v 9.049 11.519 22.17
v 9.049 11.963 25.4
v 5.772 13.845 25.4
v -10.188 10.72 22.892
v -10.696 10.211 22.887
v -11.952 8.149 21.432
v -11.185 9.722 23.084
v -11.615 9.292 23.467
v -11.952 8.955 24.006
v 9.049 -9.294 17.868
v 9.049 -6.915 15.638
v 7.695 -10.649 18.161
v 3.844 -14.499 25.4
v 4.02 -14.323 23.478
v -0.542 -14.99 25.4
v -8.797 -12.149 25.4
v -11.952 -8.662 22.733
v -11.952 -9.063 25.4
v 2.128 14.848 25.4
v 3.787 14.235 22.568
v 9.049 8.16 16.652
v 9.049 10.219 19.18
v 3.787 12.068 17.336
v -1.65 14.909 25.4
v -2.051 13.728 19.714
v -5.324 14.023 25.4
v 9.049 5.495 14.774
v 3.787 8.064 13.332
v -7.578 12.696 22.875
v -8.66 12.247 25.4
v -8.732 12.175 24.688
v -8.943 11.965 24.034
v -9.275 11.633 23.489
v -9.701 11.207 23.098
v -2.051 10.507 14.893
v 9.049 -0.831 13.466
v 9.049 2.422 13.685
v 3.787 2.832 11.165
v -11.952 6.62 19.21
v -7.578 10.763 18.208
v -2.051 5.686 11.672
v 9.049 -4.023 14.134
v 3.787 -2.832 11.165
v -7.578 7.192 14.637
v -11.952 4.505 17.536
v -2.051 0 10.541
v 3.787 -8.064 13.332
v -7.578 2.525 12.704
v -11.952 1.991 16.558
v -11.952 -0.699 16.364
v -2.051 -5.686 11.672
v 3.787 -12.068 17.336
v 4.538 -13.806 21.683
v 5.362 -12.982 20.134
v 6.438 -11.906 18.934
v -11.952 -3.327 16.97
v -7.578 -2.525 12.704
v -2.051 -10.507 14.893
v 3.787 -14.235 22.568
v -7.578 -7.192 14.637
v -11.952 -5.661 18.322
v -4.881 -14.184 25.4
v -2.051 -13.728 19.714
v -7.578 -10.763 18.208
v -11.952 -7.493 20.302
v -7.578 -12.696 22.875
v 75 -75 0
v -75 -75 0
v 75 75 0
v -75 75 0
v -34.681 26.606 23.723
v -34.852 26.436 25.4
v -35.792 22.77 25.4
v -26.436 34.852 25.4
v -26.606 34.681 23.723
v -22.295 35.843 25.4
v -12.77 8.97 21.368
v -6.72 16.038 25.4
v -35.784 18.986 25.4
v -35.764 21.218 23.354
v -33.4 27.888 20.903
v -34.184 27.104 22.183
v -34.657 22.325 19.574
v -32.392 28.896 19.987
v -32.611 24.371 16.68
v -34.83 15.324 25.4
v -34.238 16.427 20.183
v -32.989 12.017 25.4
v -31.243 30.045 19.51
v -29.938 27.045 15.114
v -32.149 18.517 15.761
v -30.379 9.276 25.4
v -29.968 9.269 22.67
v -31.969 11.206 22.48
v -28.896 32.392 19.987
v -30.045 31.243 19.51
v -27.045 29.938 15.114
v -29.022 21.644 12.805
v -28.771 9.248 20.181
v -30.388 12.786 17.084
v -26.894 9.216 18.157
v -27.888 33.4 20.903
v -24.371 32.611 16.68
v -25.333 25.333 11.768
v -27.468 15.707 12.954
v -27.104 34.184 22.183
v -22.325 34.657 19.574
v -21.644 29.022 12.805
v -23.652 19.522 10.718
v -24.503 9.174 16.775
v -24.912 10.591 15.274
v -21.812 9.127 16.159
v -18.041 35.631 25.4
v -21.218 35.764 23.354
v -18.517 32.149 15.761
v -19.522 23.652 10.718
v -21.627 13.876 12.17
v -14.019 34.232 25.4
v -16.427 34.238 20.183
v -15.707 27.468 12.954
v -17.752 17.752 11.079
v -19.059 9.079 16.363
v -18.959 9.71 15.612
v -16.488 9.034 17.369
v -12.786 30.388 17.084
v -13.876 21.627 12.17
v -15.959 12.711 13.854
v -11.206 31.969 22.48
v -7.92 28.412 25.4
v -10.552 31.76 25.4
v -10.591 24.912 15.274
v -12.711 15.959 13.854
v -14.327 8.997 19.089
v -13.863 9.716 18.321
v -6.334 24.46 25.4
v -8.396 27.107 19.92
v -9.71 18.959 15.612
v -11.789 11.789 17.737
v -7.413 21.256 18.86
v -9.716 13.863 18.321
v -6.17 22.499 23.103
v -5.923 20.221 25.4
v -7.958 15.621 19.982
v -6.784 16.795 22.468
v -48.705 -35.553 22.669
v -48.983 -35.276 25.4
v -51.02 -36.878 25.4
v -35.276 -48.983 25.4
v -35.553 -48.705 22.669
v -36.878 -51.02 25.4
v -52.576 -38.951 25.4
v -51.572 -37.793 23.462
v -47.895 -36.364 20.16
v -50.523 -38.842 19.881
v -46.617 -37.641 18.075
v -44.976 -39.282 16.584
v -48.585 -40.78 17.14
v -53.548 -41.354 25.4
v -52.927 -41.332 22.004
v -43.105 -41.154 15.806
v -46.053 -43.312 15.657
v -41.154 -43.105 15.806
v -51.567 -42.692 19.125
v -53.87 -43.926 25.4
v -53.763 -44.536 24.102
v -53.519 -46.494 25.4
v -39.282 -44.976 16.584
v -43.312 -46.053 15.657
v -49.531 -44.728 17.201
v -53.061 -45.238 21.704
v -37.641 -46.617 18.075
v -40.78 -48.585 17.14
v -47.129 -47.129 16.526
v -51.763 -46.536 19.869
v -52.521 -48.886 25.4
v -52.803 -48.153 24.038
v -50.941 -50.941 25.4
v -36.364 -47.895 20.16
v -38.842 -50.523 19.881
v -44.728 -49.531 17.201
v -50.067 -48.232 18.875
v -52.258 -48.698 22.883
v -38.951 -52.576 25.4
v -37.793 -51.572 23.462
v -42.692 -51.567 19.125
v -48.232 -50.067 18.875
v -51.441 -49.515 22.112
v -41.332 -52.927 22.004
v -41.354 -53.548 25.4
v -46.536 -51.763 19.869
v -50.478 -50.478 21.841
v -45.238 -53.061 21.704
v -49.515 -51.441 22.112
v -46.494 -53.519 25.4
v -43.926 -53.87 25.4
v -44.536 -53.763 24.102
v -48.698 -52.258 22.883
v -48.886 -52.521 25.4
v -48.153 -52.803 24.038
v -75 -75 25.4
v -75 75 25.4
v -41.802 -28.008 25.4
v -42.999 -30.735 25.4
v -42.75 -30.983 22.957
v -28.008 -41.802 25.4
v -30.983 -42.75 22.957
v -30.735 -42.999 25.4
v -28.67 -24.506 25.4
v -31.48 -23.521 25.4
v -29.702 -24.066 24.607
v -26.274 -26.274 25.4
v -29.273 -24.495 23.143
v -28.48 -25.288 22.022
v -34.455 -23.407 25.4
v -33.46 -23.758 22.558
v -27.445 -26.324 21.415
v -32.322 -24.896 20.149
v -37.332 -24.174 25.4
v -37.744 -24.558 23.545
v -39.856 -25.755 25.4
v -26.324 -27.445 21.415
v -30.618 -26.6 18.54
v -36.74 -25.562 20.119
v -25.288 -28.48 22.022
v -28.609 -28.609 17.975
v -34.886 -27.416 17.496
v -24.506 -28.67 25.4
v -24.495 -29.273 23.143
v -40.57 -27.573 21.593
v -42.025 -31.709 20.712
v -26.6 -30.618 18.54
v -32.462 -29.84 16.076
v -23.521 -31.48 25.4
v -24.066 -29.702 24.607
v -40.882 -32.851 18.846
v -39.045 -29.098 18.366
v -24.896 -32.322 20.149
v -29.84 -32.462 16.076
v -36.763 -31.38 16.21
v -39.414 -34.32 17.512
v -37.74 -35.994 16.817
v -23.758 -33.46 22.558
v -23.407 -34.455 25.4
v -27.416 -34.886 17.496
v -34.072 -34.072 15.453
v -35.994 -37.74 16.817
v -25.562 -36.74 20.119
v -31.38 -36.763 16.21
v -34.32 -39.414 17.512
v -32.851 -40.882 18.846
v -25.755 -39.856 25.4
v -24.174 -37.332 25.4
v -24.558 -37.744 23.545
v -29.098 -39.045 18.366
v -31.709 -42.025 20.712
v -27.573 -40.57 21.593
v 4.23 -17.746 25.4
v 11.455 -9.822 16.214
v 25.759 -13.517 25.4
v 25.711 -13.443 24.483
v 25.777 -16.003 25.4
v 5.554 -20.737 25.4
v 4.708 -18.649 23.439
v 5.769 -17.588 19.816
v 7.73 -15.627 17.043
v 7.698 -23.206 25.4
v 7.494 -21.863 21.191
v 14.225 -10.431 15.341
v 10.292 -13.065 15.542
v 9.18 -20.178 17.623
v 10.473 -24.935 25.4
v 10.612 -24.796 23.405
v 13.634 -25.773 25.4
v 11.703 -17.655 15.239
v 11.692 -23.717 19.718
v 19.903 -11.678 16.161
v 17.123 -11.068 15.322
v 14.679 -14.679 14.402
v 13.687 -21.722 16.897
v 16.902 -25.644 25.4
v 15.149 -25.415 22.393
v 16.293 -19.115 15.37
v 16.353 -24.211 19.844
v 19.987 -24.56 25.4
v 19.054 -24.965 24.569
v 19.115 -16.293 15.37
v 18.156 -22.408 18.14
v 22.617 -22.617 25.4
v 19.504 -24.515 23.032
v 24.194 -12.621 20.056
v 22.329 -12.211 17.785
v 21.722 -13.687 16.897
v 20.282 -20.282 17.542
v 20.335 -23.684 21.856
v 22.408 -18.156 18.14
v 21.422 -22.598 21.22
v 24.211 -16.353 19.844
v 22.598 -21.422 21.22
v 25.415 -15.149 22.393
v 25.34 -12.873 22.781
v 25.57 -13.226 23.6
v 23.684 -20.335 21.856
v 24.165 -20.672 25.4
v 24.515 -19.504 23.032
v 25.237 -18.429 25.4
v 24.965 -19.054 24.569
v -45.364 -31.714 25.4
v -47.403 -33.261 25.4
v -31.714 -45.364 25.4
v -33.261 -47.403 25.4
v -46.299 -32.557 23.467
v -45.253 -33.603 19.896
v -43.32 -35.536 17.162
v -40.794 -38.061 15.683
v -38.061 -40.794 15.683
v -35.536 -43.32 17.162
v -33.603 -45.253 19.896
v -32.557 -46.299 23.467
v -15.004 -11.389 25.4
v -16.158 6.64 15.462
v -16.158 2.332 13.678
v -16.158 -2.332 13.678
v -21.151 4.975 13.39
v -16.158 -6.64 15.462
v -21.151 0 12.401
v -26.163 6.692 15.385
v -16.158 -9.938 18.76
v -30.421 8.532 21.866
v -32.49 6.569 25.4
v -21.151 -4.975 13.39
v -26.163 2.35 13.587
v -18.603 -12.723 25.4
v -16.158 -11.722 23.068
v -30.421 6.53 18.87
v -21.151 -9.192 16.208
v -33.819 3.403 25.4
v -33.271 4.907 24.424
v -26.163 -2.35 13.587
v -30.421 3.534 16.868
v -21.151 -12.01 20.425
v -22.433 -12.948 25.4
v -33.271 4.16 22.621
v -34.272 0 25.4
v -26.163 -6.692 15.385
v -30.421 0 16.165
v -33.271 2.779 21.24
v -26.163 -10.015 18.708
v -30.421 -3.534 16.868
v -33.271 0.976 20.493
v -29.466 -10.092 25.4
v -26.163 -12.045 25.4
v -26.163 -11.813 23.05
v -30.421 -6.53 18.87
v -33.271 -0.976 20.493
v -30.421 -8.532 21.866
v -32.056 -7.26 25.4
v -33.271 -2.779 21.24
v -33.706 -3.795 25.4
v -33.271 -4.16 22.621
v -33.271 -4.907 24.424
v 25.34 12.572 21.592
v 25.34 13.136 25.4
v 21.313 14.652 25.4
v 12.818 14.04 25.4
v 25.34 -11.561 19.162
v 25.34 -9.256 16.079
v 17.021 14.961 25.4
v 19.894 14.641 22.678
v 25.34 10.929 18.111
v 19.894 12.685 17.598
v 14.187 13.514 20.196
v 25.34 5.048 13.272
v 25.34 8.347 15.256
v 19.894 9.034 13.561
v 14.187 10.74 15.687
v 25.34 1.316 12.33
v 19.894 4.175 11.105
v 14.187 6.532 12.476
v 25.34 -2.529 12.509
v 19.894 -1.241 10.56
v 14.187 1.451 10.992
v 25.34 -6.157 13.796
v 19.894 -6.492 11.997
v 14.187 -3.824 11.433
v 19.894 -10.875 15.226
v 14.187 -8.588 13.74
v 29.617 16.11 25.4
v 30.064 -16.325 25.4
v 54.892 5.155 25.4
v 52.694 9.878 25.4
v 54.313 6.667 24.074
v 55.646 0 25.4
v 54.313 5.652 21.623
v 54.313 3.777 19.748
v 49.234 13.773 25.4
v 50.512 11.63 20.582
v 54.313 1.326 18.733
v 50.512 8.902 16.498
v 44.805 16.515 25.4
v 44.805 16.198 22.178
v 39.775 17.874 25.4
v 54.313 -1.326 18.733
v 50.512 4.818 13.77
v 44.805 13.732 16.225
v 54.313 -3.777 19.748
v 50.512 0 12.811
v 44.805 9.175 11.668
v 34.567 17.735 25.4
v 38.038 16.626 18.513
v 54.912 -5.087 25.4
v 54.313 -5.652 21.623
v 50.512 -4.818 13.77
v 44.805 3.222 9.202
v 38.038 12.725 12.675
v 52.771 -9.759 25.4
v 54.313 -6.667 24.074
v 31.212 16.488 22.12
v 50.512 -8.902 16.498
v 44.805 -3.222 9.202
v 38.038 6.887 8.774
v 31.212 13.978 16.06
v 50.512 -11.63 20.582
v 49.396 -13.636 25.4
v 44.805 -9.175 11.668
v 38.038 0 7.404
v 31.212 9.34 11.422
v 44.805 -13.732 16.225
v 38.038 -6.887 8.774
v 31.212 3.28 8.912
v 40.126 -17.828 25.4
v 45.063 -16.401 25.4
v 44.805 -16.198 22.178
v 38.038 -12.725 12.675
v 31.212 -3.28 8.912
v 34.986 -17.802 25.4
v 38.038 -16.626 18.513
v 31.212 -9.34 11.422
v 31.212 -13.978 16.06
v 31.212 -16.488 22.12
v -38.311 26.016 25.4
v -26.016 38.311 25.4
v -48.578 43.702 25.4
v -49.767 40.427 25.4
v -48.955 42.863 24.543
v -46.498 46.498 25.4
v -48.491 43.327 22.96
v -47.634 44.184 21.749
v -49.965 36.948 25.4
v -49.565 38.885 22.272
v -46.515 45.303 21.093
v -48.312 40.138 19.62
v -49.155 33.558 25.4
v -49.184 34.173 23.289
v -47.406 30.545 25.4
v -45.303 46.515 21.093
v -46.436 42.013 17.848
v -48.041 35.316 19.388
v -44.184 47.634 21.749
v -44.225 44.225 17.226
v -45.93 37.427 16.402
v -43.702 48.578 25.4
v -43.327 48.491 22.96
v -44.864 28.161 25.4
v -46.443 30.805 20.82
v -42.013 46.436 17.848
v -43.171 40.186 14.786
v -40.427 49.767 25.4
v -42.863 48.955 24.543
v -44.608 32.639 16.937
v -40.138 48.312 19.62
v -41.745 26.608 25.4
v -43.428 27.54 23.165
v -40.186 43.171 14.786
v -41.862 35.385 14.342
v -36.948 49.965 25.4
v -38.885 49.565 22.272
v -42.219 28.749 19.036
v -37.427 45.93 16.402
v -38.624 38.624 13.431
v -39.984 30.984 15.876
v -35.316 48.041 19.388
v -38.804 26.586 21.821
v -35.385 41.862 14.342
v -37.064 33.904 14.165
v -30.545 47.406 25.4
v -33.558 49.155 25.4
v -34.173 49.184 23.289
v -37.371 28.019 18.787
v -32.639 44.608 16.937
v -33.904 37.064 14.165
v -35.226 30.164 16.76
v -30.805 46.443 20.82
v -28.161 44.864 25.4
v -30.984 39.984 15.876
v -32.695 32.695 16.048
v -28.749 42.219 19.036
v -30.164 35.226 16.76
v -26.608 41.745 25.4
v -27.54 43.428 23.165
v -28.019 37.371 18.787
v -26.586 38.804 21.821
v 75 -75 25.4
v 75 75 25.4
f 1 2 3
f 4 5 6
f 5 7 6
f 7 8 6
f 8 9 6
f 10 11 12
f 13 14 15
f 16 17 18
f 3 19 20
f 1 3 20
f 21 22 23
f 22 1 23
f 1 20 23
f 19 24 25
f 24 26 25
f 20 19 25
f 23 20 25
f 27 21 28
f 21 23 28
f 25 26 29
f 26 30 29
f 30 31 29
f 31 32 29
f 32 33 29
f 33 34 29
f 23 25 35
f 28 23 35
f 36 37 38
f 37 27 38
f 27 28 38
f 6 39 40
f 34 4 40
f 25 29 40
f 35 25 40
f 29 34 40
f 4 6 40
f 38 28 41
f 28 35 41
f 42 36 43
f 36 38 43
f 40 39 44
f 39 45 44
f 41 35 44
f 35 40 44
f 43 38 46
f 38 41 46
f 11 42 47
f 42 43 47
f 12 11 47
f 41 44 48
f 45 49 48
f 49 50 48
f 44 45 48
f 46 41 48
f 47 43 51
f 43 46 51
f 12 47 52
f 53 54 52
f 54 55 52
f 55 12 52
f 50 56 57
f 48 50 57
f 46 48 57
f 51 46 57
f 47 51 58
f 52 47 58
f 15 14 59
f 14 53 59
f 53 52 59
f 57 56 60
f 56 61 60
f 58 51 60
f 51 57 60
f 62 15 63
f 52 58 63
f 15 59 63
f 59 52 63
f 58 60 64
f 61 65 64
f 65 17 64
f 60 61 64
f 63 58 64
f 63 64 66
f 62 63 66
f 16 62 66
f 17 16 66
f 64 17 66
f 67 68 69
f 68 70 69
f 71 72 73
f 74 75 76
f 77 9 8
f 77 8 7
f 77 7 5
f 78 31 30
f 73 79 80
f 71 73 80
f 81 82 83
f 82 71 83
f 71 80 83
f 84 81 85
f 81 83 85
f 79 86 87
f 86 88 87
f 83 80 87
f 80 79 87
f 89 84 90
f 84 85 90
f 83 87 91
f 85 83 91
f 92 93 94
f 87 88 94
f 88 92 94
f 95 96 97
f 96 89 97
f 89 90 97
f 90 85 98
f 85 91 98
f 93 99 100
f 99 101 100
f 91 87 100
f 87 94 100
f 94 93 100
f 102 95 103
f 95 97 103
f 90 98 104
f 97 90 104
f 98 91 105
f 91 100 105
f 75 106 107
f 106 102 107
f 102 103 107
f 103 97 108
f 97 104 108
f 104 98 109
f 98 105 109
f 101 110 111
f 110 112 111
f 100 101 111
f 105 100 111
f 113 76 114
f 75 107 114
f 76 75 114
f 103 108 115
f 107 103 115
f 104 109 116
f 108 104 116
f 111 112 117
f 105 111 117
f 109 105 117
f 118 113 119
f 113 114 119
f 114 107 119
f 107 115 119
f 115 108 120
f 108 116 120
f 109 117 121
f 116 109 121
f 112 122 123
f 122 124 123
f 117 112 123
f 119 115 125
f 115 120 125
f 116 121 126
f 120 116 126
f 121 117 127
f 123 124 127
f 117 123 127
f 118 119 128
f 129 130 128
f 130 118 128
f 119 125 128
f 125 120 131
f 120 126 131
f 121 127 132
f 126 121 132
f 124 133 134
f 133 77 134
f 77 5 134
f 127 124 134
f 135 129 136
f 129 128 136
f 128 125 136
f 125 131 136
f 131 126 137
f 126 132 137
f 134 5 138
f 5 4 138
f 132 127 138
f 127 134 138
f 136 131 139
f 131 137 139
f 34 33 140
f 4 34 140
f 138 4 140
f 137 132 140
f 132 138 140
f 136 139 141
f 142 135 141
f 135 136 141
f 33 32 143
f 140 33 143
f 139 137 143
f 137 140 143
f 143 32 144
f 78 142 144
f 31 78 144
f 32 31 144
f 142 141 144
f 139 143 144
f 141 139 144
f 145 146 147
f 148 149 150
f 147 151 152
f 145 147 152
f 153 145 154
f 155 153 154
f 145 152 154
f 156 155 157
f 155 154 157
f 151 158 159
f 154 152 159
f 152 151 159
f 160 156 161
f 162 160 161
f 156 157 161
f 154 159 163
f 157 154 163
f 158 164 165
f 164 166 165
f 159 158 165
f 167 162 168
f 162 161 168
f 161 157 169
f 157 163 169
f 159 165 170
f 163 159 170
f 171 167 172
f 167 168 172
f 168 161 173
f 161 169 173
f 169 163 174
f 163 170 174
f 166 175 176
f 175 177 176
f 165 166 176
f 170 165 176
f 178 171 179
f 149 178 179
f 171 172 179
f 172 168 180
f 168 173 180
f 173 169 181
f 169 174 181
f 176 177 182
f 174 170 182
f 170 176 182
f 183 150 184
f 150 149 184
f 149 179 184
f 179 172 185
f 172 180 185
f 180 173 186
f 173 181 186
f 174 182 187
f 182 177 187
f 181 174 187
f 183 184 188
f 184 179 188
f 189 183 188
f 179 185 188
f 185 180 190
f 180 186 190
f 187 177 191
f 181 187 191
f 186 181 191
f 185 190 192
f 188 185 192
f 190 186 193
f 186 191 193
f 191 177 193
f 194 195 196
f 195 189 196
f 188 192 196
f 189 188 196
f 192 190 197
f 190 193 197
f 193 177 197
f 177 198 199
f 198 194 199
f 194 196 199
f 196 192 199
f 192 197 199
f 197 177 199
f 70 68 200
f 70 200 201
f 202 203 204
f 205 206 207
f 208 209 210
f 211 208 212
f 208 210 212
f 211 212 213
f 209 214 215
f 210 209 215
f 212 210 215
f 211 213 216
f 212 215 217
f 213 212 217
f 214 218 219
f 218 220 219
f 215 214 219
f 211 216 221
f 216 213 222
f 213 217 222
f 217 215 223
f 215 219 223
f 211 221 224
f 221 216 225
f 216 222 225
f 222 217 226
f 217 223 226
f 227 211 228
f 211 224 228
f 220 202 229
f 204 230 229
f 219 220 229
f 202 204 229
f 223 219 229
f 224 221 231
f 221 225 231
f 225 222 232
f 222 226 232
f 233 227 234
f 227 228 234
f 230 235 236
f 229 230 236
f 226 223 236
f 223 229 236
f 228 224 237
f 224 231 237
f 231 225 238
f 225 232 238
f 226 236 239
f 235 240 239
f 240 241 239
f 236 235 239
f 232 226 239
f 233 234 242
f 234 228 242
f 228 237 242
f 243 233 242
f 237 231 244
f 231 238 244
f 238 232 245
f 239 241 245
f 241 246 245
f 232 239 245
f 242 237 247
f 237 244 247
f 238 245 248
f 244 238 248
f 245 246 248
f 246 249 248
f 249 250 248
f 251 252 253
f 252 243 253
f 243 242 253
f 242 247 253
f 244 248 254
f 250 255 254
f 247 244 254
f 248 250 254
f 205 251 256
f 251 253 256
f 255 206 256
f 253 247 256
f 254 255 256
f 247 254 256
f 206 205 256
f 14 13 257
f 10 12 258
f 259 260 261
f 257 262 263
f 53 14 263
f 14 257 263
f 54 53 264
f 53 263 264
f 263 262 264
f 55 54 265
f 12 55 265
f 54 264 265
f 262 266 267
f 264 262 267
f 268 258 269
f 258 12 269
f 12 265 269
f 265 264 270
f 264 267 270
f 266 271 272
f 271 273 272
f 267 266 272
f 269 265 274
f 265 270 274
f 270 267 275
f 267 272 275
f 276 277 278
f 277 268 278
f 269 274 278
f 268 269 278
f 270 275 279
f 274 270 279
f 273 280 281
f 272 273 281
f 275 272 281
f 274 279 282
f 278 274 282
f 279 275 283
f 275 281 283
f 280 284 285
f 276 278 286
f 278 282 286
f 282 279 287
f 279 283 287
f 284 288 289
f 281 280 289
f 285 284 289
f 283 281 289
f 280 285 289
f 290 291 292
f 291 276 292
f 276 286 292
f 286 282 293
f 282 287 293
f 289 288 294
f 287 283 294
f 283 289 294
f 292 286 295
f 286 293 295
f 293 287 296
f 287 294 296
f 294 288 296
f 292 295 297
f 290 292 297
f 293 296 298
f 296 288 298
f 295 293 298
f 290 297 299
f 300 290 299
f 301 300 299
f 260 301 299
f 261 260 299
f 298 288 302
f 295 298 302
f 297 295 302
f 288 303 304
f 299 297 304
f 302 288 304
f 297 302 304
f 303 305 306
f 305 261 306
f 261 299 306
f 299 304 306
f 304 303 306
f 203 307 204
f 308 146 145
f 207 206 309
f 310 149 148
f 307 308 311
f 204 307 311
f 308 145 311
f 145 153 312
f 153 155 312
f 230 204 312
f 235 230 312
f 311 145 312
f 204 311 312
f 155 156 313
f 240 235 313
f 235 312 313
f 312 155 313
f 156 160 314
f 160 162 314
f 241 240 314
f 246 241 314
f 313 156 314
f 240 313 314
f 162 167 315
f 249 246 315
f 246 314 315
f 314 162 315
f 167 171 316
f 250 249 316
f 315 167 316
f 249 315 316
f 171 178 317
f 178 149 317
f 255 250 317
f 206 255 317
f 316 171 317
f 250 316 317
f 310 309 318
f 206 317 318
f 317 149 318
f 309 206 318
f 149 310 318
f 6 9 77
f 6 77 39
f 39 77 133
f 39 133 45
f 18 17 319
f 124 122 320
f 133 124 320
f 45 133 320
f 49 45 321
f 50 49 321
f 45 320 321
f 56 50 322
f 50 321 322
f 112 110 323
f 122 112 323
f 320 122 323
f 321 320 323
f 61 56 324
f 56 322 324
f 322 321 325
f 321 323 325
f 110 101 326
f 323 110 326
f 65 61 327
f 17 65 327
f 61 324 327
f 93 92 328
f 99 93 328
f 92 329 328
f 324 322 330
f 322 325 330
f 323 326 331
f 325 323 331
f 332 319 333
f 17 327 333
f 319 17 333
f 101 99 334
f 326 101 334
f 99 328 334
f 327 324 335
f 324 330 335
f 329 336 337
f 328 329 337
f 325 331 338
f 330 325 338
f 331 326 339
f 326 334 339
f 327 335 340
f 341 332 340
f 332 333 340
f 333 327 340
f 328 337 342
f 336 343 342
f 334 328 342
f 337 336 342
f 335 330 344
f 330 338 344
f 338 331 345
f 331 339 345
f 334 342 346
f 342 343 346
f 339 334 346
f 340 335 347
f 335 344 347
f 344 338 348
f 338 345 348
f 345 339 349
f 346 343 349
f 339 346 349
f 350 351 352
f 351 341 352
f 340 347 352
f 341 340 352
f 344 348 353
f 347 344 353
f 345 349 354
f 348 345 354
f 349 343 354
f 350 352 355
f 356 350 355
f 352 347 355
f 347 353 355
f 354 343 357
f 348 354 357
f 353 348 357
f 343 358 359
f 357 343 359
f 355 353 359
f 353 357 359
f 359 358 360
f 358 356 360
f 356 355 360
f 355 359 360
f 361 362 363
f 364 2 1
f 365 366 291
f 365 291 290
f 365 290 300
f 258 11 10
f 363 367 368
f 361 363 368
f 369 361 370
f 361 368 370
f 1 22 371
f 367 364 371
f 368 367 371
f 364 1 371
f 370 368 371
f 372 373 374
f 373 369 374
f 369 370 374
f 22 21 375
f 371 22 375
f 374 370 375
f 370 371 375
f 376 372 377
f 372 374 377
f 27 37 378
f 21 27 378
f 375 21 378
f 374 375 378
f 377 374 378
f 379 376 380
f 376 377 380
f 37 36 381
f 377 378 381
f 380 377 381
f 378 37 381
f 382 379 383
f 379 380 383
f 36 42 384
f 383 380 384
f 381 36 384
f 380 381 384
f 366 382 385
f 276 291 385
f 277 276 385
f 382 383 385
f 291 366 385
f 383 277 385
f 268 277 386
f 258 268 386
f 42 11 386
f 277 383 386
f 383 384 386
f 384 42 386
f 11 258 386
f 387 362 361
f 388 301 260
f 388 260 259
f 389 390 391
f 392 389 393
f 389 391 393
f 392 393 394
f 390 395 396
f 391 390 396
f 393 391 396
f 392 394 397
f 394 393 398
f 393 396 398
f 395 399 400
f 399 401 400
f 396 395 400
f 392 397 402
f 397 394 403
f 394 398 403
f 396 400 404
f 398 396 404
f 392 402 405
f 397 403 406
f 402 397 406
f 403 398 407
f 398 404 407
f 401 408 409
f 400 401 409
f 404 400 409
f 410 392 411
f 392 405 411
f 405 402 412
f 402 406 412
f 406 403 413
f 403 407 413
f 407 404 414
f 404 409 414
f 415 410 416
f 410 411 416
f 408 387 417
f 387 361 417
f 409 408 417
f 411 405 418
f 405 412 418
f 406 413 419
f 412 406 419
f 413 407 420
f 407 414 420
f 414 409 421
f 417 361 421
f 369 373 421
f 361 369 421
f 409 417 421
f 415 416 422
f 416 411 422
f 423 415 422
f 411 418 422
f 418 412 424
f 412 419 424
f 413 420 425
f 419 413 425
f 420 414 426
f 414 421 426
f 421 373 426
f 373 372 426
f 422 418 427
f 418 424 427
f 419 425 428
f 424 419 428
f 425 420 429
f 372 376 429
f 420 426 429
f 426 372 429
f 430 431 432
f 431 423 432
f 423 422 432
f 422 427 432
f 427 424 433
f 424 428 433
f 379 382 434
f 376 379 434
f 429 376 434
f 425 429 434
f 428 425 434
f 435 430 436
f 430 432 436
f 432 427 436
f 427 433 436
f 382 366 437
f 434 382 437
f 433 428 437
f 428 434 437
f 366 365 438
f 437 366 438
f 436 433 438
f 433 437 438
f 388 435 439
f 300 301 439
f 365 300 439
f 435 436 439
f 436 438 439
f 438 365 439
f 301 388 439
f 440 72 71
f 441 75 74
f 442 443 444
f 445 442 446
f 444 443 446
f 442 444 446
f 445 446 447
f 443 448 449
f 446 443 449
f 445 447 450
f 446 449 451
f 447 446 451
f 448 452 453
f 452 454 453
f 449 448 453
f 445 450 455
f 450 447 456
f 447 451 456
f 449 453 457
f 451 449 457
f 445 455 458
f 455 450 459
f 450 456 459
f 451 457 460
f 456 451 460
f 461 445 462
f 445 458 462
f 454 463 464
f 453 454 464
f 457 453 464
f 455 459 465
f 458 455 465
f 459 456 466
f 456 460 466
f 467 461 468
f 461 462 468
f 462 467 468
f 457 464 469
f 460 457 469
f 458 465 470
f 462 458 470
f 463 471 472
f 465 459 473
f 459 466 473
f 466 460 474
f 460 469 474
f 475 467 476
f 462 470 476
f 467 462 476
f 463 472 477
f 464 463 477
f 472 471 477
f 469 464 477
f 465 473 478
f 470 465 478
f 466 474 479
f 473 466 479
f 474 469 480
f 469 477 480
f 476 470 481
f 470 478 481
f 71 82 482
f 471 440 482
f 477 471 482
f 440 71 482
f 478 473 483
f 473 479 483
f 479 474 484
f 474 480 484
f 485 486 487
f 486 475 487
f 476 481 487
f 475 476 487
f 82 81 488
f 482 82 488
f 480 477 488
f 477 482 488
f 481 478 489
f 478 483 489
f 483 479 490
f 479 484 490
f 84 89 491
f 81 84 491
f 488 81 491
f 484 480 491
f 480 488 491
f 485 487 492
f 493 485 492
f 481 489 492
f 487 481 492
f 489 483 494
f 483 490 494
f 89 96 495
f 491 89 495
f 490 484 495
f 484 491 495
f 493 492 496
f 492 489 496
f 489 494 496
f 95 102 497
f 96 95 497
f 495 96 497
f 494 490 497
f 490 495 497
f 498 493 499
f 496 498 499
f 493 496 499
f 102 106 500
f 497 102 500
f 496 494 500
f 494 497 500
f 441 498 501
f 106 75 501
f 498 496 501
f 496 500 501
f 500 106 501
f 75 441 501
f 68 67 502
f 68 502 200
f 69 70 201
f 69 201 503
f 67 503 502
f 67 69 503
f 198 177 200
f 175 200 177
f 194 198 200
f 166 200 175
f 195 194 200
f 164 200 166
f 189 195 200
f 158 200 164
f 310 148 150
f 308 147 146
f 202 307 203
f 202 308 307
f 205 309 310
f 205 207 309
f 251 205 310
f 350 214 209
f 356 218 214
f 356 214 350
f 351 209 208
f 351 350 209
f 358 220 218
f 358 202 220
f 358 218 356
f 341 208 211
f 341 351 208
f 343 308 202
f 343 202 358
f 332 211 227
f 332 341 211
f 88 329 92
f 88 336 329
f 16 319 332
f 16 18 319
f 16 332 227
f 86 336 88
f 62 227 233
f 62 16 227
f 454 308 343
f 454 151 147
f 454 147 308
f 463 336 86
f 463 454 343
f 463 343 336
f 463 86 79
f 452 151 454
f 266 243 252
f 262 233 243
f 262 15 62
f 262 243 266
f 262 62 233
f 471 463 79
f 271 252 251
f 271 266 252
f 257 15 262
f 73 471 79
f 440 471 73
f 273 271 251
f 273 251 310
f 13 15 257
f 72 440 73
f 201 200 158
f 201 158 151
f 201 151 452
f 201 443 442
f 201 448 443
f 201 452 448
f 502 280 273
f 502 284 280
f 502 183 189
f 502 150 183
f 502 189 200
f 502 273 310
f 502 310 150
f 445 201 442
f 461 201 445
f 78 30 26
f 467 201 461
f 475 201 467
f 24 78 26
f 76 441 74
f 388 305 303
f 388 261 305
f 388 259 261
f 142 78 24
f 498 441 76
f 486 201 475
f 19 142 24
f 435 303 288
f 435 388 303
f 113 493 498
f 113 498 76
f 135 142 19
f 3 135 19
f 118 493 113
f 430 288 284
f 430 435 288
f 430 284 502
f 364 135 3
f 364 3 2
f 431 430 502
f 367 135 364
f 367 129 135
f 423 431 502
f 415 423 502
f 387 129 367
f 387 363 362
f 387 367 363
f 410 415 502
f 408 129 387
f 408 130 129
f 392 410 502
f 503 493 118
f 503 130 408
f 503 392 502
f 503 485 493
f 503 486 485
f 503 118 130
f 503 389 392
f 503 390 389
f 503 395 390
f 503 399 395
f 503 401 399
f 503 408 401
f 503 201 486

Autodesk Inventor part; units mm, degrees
sketch "Boceto1" plane through (0, 0, 0) normal (0, 0, 1) x (1, 0, 0)
  line L0 (-75, 75) -> (75, 75)
  line L1 (75, 75) -> (75, -75)
  line L2 (75, -75) -> (-75, -75)
  line L3 (-75, -75) -> (-75, 75)
  line L4 (-75, 75) -> (75, -75) construction
  line L5 (75, 75) -> (-75, -75) construction
  point P0 (0, 0)
  dimension "d0" = 150
  dimension "d1" = 150
extrude "Extrusión1" add sketch "Boceto1" along normal blind 25.4
sketch "Boceto3" plane through (0, 0, 0) normal (0, 1, 0) x (-1, 0, 0)
  line L0 (-75, 25.4) -> (75, 25.4) projected
  arc A0 (-15, 25.4) -> (15, 25.4) centre (0, 25.4) ccw
  line L1 (15, 25.4) -> (-15, 25.4)
  point P0 (0, 0)
  dimension "d7" = 15
revolve "Revolución2" cut sketch "Boceto3" angle 360 about axis through (75, 0, 25.4) along (-1, 0, 0)
ref_plane "Plano de trabajo1" through (-75, -75, 0) normal (-0.7071, 0.7071, 0) x (0, 0, 1)
ref_plane "Plano de trabajo2" through (75, -75, 0) normal (-0.7071, -0.7071, 0) x (0, 0, 1)
sketch "Boceto4" plane through (-75, -75, 0) normal (-0.7071, 0.7071, 0) x (0, 0, 1)
  line L0 (25.4, 106.066) -> (25.4, 0) projected
  arc A0 (25.4, 68.9087) -> (25.4, 48.9087) centre (25.4, 58.9087) ccw
  line L1 (25.4, 48.9087) -> (25.4, 68.9087)
  point P0 (0, 106.066)
  dimension "d11" = 10
sketch "Boceto5" plane through (75, -75, 0) normal (-0.7071, -0.7071, 0) x (0, 0, 1)
  line L0 (25.4, 106.066) -> (25.4, 212.132) projected
  arc A0 (25.4, 171.8235) -> (25.4, 147.8235) centre (25.4, 159.8235) ccw
  line L1 (25.4, 171.8235) -> (25.4, 147.8235)
  point P0 (0, 106.066)
  dimension "d12" = 12
sketch "Boceto6" plane through (0, 0, 0) normal (0, 1, 0) x (-1, 0, 0)
  arc A0 (-55.646, 25.4) -> (-19.646, 25.4) centre (-37.646, 25.4) ccw
  line L0 (-19.646, 25.4) -> (-55.646, 25.4)
  line L1 (-75, 25.4) -> (75, 25.4) projected
  point P0 (0, 0)
  dimension "d13" = 18
revolve "Revolución3" cut sketch "Boceto5" angle 360 about axis through (0, 0, 25.4) along (-0.7071, 0.7071, 0)
revolve "Revolución4" cut sketch "Boceto4" angle 360 about axis through (0, 0, 25.4) along (-0.7071, -0.7071, 0)
revolve "Revolución5" cut sketch "Boceto6" angle 360 about axis through (19.646, 0, 25.4) along (1, 0, 0)
sketch "Boceto7" plane through (0, 0, 0) normal (0, 1, 0) x (-1, 0, 0)
  line L0 (-75, 25.4) -> (75, 25.4) projected
  arc A0 (-33.0988, 25.4) -> (-3.0988, 25.4) centre (-18.0988, 25.4) ccw
  line L1 (-3.0988, 25.4) -> (-33.0988, 25.4)
  line L2 (-55.646, 25.4) -> (-19.646, 25.4) projected
  point P0 (0, 0)
  dimension "d17" = 15
revolve "Revolución6" cut sketch "Boceto7" angle 360 about axis through (3.0988, 0, 25.4) along (1, 0, 0)
sketch "Boceto9" plane through (75, -75, 0) normal (-0.7071, -0.7071, 0) x (0, 0, 1)
  line L0 (25.4, 106.066) -> (25.4, 0) projected
  arc A0 (25.4, 96.0806) -> (25.4, 74.0806) centre (25.4, 85.0806) ccw
  line L1 (25.4, 96.0806) -> (25.4, 74.0806)
  point P0 (0, 106.066)
  dimension "d19" = 11
revolve "Revolución7" cut sketch "Boceto9" angle 360 about axis through (0, 0, 25.4) along (0.7071, -0.7071, 0)
sketch "Boceto10" plane through (-75, -75, 0) normal (-0.7071, 0.7071, 0) x (0, 0, 1)
  line L0 (25.4, 106.066) -> (25.4, 0) projected
  arc A0 (25.4, 58.9481) -> (25.4, 38.9481) centre (25.4, 48.9481) ccw
  line L1 (25.4, 38.9481) -> (25.4, 58.9481)
  line L2 (25.4, 68.9087) -> (25.4, 48.9087) projected
  arc A1 (25.4, 54.0246) -> (25.4, 34.0246) centre (25.4, 44.0246) ccw
  line L3 (25.4, 34.0246) -> (25.4, 54.0246)
  point P0 (0, 106.066)
  dimension "d21" = 10
  dimension "d22" = 10
revolve "Revolución8" cut sketch "Boceto10" angle 360 about axis through (0, 0, 25.4) along (-0.7071, -0.7071, 0)
sketch "Boceto11" plane through (75, -75, 0) normal (-0.7071, -0.7071, 0) x (0, 0, 1)
  line L0 (25.4, 212.132) -> (25.4, 106.066) projected
  arc A0 (25.4, 150.634) -> (25.4, 120.634) centre (25.4, 135.634) ccw
  line L1 (25.4, 120.634) -> (25.4, 150.634)
  point P0 (0, 106.066)
  dimension "d24" = 15
revolve "Revolución9" cut sketch "Boceto11" angle 360 about axis through (-75, 75, 25.4) along (0.7071, -0.7071, 0)
sketch "Boceto12" plane through (0, 0, 0) normal (0, 1, 0) x (-1, 0, 0)
  line L0 (23.3453, 25.4) -> (42.9986, 25.4) projected
  arc A0 (8.2719, 25.4) -> (34.2719, 25.4) centre (21.2719, 25.4) ccw
  line L1 (8.2719, 25.4) -> (34.2719, 25.4)
  line L2 (75, 25.4) -> (-75, 25.4) projected
  point P0 (0, 0)
  point P1 (30.7351, 25.4)
  dimension "d26" = 13
revolve "Revolución10" cut sketch "Boceto12" angle 360 about axis through (-23.3453, 0, 25.4) along (-1, 0, 0)
properties part number "Placa - Daños Esfera"
